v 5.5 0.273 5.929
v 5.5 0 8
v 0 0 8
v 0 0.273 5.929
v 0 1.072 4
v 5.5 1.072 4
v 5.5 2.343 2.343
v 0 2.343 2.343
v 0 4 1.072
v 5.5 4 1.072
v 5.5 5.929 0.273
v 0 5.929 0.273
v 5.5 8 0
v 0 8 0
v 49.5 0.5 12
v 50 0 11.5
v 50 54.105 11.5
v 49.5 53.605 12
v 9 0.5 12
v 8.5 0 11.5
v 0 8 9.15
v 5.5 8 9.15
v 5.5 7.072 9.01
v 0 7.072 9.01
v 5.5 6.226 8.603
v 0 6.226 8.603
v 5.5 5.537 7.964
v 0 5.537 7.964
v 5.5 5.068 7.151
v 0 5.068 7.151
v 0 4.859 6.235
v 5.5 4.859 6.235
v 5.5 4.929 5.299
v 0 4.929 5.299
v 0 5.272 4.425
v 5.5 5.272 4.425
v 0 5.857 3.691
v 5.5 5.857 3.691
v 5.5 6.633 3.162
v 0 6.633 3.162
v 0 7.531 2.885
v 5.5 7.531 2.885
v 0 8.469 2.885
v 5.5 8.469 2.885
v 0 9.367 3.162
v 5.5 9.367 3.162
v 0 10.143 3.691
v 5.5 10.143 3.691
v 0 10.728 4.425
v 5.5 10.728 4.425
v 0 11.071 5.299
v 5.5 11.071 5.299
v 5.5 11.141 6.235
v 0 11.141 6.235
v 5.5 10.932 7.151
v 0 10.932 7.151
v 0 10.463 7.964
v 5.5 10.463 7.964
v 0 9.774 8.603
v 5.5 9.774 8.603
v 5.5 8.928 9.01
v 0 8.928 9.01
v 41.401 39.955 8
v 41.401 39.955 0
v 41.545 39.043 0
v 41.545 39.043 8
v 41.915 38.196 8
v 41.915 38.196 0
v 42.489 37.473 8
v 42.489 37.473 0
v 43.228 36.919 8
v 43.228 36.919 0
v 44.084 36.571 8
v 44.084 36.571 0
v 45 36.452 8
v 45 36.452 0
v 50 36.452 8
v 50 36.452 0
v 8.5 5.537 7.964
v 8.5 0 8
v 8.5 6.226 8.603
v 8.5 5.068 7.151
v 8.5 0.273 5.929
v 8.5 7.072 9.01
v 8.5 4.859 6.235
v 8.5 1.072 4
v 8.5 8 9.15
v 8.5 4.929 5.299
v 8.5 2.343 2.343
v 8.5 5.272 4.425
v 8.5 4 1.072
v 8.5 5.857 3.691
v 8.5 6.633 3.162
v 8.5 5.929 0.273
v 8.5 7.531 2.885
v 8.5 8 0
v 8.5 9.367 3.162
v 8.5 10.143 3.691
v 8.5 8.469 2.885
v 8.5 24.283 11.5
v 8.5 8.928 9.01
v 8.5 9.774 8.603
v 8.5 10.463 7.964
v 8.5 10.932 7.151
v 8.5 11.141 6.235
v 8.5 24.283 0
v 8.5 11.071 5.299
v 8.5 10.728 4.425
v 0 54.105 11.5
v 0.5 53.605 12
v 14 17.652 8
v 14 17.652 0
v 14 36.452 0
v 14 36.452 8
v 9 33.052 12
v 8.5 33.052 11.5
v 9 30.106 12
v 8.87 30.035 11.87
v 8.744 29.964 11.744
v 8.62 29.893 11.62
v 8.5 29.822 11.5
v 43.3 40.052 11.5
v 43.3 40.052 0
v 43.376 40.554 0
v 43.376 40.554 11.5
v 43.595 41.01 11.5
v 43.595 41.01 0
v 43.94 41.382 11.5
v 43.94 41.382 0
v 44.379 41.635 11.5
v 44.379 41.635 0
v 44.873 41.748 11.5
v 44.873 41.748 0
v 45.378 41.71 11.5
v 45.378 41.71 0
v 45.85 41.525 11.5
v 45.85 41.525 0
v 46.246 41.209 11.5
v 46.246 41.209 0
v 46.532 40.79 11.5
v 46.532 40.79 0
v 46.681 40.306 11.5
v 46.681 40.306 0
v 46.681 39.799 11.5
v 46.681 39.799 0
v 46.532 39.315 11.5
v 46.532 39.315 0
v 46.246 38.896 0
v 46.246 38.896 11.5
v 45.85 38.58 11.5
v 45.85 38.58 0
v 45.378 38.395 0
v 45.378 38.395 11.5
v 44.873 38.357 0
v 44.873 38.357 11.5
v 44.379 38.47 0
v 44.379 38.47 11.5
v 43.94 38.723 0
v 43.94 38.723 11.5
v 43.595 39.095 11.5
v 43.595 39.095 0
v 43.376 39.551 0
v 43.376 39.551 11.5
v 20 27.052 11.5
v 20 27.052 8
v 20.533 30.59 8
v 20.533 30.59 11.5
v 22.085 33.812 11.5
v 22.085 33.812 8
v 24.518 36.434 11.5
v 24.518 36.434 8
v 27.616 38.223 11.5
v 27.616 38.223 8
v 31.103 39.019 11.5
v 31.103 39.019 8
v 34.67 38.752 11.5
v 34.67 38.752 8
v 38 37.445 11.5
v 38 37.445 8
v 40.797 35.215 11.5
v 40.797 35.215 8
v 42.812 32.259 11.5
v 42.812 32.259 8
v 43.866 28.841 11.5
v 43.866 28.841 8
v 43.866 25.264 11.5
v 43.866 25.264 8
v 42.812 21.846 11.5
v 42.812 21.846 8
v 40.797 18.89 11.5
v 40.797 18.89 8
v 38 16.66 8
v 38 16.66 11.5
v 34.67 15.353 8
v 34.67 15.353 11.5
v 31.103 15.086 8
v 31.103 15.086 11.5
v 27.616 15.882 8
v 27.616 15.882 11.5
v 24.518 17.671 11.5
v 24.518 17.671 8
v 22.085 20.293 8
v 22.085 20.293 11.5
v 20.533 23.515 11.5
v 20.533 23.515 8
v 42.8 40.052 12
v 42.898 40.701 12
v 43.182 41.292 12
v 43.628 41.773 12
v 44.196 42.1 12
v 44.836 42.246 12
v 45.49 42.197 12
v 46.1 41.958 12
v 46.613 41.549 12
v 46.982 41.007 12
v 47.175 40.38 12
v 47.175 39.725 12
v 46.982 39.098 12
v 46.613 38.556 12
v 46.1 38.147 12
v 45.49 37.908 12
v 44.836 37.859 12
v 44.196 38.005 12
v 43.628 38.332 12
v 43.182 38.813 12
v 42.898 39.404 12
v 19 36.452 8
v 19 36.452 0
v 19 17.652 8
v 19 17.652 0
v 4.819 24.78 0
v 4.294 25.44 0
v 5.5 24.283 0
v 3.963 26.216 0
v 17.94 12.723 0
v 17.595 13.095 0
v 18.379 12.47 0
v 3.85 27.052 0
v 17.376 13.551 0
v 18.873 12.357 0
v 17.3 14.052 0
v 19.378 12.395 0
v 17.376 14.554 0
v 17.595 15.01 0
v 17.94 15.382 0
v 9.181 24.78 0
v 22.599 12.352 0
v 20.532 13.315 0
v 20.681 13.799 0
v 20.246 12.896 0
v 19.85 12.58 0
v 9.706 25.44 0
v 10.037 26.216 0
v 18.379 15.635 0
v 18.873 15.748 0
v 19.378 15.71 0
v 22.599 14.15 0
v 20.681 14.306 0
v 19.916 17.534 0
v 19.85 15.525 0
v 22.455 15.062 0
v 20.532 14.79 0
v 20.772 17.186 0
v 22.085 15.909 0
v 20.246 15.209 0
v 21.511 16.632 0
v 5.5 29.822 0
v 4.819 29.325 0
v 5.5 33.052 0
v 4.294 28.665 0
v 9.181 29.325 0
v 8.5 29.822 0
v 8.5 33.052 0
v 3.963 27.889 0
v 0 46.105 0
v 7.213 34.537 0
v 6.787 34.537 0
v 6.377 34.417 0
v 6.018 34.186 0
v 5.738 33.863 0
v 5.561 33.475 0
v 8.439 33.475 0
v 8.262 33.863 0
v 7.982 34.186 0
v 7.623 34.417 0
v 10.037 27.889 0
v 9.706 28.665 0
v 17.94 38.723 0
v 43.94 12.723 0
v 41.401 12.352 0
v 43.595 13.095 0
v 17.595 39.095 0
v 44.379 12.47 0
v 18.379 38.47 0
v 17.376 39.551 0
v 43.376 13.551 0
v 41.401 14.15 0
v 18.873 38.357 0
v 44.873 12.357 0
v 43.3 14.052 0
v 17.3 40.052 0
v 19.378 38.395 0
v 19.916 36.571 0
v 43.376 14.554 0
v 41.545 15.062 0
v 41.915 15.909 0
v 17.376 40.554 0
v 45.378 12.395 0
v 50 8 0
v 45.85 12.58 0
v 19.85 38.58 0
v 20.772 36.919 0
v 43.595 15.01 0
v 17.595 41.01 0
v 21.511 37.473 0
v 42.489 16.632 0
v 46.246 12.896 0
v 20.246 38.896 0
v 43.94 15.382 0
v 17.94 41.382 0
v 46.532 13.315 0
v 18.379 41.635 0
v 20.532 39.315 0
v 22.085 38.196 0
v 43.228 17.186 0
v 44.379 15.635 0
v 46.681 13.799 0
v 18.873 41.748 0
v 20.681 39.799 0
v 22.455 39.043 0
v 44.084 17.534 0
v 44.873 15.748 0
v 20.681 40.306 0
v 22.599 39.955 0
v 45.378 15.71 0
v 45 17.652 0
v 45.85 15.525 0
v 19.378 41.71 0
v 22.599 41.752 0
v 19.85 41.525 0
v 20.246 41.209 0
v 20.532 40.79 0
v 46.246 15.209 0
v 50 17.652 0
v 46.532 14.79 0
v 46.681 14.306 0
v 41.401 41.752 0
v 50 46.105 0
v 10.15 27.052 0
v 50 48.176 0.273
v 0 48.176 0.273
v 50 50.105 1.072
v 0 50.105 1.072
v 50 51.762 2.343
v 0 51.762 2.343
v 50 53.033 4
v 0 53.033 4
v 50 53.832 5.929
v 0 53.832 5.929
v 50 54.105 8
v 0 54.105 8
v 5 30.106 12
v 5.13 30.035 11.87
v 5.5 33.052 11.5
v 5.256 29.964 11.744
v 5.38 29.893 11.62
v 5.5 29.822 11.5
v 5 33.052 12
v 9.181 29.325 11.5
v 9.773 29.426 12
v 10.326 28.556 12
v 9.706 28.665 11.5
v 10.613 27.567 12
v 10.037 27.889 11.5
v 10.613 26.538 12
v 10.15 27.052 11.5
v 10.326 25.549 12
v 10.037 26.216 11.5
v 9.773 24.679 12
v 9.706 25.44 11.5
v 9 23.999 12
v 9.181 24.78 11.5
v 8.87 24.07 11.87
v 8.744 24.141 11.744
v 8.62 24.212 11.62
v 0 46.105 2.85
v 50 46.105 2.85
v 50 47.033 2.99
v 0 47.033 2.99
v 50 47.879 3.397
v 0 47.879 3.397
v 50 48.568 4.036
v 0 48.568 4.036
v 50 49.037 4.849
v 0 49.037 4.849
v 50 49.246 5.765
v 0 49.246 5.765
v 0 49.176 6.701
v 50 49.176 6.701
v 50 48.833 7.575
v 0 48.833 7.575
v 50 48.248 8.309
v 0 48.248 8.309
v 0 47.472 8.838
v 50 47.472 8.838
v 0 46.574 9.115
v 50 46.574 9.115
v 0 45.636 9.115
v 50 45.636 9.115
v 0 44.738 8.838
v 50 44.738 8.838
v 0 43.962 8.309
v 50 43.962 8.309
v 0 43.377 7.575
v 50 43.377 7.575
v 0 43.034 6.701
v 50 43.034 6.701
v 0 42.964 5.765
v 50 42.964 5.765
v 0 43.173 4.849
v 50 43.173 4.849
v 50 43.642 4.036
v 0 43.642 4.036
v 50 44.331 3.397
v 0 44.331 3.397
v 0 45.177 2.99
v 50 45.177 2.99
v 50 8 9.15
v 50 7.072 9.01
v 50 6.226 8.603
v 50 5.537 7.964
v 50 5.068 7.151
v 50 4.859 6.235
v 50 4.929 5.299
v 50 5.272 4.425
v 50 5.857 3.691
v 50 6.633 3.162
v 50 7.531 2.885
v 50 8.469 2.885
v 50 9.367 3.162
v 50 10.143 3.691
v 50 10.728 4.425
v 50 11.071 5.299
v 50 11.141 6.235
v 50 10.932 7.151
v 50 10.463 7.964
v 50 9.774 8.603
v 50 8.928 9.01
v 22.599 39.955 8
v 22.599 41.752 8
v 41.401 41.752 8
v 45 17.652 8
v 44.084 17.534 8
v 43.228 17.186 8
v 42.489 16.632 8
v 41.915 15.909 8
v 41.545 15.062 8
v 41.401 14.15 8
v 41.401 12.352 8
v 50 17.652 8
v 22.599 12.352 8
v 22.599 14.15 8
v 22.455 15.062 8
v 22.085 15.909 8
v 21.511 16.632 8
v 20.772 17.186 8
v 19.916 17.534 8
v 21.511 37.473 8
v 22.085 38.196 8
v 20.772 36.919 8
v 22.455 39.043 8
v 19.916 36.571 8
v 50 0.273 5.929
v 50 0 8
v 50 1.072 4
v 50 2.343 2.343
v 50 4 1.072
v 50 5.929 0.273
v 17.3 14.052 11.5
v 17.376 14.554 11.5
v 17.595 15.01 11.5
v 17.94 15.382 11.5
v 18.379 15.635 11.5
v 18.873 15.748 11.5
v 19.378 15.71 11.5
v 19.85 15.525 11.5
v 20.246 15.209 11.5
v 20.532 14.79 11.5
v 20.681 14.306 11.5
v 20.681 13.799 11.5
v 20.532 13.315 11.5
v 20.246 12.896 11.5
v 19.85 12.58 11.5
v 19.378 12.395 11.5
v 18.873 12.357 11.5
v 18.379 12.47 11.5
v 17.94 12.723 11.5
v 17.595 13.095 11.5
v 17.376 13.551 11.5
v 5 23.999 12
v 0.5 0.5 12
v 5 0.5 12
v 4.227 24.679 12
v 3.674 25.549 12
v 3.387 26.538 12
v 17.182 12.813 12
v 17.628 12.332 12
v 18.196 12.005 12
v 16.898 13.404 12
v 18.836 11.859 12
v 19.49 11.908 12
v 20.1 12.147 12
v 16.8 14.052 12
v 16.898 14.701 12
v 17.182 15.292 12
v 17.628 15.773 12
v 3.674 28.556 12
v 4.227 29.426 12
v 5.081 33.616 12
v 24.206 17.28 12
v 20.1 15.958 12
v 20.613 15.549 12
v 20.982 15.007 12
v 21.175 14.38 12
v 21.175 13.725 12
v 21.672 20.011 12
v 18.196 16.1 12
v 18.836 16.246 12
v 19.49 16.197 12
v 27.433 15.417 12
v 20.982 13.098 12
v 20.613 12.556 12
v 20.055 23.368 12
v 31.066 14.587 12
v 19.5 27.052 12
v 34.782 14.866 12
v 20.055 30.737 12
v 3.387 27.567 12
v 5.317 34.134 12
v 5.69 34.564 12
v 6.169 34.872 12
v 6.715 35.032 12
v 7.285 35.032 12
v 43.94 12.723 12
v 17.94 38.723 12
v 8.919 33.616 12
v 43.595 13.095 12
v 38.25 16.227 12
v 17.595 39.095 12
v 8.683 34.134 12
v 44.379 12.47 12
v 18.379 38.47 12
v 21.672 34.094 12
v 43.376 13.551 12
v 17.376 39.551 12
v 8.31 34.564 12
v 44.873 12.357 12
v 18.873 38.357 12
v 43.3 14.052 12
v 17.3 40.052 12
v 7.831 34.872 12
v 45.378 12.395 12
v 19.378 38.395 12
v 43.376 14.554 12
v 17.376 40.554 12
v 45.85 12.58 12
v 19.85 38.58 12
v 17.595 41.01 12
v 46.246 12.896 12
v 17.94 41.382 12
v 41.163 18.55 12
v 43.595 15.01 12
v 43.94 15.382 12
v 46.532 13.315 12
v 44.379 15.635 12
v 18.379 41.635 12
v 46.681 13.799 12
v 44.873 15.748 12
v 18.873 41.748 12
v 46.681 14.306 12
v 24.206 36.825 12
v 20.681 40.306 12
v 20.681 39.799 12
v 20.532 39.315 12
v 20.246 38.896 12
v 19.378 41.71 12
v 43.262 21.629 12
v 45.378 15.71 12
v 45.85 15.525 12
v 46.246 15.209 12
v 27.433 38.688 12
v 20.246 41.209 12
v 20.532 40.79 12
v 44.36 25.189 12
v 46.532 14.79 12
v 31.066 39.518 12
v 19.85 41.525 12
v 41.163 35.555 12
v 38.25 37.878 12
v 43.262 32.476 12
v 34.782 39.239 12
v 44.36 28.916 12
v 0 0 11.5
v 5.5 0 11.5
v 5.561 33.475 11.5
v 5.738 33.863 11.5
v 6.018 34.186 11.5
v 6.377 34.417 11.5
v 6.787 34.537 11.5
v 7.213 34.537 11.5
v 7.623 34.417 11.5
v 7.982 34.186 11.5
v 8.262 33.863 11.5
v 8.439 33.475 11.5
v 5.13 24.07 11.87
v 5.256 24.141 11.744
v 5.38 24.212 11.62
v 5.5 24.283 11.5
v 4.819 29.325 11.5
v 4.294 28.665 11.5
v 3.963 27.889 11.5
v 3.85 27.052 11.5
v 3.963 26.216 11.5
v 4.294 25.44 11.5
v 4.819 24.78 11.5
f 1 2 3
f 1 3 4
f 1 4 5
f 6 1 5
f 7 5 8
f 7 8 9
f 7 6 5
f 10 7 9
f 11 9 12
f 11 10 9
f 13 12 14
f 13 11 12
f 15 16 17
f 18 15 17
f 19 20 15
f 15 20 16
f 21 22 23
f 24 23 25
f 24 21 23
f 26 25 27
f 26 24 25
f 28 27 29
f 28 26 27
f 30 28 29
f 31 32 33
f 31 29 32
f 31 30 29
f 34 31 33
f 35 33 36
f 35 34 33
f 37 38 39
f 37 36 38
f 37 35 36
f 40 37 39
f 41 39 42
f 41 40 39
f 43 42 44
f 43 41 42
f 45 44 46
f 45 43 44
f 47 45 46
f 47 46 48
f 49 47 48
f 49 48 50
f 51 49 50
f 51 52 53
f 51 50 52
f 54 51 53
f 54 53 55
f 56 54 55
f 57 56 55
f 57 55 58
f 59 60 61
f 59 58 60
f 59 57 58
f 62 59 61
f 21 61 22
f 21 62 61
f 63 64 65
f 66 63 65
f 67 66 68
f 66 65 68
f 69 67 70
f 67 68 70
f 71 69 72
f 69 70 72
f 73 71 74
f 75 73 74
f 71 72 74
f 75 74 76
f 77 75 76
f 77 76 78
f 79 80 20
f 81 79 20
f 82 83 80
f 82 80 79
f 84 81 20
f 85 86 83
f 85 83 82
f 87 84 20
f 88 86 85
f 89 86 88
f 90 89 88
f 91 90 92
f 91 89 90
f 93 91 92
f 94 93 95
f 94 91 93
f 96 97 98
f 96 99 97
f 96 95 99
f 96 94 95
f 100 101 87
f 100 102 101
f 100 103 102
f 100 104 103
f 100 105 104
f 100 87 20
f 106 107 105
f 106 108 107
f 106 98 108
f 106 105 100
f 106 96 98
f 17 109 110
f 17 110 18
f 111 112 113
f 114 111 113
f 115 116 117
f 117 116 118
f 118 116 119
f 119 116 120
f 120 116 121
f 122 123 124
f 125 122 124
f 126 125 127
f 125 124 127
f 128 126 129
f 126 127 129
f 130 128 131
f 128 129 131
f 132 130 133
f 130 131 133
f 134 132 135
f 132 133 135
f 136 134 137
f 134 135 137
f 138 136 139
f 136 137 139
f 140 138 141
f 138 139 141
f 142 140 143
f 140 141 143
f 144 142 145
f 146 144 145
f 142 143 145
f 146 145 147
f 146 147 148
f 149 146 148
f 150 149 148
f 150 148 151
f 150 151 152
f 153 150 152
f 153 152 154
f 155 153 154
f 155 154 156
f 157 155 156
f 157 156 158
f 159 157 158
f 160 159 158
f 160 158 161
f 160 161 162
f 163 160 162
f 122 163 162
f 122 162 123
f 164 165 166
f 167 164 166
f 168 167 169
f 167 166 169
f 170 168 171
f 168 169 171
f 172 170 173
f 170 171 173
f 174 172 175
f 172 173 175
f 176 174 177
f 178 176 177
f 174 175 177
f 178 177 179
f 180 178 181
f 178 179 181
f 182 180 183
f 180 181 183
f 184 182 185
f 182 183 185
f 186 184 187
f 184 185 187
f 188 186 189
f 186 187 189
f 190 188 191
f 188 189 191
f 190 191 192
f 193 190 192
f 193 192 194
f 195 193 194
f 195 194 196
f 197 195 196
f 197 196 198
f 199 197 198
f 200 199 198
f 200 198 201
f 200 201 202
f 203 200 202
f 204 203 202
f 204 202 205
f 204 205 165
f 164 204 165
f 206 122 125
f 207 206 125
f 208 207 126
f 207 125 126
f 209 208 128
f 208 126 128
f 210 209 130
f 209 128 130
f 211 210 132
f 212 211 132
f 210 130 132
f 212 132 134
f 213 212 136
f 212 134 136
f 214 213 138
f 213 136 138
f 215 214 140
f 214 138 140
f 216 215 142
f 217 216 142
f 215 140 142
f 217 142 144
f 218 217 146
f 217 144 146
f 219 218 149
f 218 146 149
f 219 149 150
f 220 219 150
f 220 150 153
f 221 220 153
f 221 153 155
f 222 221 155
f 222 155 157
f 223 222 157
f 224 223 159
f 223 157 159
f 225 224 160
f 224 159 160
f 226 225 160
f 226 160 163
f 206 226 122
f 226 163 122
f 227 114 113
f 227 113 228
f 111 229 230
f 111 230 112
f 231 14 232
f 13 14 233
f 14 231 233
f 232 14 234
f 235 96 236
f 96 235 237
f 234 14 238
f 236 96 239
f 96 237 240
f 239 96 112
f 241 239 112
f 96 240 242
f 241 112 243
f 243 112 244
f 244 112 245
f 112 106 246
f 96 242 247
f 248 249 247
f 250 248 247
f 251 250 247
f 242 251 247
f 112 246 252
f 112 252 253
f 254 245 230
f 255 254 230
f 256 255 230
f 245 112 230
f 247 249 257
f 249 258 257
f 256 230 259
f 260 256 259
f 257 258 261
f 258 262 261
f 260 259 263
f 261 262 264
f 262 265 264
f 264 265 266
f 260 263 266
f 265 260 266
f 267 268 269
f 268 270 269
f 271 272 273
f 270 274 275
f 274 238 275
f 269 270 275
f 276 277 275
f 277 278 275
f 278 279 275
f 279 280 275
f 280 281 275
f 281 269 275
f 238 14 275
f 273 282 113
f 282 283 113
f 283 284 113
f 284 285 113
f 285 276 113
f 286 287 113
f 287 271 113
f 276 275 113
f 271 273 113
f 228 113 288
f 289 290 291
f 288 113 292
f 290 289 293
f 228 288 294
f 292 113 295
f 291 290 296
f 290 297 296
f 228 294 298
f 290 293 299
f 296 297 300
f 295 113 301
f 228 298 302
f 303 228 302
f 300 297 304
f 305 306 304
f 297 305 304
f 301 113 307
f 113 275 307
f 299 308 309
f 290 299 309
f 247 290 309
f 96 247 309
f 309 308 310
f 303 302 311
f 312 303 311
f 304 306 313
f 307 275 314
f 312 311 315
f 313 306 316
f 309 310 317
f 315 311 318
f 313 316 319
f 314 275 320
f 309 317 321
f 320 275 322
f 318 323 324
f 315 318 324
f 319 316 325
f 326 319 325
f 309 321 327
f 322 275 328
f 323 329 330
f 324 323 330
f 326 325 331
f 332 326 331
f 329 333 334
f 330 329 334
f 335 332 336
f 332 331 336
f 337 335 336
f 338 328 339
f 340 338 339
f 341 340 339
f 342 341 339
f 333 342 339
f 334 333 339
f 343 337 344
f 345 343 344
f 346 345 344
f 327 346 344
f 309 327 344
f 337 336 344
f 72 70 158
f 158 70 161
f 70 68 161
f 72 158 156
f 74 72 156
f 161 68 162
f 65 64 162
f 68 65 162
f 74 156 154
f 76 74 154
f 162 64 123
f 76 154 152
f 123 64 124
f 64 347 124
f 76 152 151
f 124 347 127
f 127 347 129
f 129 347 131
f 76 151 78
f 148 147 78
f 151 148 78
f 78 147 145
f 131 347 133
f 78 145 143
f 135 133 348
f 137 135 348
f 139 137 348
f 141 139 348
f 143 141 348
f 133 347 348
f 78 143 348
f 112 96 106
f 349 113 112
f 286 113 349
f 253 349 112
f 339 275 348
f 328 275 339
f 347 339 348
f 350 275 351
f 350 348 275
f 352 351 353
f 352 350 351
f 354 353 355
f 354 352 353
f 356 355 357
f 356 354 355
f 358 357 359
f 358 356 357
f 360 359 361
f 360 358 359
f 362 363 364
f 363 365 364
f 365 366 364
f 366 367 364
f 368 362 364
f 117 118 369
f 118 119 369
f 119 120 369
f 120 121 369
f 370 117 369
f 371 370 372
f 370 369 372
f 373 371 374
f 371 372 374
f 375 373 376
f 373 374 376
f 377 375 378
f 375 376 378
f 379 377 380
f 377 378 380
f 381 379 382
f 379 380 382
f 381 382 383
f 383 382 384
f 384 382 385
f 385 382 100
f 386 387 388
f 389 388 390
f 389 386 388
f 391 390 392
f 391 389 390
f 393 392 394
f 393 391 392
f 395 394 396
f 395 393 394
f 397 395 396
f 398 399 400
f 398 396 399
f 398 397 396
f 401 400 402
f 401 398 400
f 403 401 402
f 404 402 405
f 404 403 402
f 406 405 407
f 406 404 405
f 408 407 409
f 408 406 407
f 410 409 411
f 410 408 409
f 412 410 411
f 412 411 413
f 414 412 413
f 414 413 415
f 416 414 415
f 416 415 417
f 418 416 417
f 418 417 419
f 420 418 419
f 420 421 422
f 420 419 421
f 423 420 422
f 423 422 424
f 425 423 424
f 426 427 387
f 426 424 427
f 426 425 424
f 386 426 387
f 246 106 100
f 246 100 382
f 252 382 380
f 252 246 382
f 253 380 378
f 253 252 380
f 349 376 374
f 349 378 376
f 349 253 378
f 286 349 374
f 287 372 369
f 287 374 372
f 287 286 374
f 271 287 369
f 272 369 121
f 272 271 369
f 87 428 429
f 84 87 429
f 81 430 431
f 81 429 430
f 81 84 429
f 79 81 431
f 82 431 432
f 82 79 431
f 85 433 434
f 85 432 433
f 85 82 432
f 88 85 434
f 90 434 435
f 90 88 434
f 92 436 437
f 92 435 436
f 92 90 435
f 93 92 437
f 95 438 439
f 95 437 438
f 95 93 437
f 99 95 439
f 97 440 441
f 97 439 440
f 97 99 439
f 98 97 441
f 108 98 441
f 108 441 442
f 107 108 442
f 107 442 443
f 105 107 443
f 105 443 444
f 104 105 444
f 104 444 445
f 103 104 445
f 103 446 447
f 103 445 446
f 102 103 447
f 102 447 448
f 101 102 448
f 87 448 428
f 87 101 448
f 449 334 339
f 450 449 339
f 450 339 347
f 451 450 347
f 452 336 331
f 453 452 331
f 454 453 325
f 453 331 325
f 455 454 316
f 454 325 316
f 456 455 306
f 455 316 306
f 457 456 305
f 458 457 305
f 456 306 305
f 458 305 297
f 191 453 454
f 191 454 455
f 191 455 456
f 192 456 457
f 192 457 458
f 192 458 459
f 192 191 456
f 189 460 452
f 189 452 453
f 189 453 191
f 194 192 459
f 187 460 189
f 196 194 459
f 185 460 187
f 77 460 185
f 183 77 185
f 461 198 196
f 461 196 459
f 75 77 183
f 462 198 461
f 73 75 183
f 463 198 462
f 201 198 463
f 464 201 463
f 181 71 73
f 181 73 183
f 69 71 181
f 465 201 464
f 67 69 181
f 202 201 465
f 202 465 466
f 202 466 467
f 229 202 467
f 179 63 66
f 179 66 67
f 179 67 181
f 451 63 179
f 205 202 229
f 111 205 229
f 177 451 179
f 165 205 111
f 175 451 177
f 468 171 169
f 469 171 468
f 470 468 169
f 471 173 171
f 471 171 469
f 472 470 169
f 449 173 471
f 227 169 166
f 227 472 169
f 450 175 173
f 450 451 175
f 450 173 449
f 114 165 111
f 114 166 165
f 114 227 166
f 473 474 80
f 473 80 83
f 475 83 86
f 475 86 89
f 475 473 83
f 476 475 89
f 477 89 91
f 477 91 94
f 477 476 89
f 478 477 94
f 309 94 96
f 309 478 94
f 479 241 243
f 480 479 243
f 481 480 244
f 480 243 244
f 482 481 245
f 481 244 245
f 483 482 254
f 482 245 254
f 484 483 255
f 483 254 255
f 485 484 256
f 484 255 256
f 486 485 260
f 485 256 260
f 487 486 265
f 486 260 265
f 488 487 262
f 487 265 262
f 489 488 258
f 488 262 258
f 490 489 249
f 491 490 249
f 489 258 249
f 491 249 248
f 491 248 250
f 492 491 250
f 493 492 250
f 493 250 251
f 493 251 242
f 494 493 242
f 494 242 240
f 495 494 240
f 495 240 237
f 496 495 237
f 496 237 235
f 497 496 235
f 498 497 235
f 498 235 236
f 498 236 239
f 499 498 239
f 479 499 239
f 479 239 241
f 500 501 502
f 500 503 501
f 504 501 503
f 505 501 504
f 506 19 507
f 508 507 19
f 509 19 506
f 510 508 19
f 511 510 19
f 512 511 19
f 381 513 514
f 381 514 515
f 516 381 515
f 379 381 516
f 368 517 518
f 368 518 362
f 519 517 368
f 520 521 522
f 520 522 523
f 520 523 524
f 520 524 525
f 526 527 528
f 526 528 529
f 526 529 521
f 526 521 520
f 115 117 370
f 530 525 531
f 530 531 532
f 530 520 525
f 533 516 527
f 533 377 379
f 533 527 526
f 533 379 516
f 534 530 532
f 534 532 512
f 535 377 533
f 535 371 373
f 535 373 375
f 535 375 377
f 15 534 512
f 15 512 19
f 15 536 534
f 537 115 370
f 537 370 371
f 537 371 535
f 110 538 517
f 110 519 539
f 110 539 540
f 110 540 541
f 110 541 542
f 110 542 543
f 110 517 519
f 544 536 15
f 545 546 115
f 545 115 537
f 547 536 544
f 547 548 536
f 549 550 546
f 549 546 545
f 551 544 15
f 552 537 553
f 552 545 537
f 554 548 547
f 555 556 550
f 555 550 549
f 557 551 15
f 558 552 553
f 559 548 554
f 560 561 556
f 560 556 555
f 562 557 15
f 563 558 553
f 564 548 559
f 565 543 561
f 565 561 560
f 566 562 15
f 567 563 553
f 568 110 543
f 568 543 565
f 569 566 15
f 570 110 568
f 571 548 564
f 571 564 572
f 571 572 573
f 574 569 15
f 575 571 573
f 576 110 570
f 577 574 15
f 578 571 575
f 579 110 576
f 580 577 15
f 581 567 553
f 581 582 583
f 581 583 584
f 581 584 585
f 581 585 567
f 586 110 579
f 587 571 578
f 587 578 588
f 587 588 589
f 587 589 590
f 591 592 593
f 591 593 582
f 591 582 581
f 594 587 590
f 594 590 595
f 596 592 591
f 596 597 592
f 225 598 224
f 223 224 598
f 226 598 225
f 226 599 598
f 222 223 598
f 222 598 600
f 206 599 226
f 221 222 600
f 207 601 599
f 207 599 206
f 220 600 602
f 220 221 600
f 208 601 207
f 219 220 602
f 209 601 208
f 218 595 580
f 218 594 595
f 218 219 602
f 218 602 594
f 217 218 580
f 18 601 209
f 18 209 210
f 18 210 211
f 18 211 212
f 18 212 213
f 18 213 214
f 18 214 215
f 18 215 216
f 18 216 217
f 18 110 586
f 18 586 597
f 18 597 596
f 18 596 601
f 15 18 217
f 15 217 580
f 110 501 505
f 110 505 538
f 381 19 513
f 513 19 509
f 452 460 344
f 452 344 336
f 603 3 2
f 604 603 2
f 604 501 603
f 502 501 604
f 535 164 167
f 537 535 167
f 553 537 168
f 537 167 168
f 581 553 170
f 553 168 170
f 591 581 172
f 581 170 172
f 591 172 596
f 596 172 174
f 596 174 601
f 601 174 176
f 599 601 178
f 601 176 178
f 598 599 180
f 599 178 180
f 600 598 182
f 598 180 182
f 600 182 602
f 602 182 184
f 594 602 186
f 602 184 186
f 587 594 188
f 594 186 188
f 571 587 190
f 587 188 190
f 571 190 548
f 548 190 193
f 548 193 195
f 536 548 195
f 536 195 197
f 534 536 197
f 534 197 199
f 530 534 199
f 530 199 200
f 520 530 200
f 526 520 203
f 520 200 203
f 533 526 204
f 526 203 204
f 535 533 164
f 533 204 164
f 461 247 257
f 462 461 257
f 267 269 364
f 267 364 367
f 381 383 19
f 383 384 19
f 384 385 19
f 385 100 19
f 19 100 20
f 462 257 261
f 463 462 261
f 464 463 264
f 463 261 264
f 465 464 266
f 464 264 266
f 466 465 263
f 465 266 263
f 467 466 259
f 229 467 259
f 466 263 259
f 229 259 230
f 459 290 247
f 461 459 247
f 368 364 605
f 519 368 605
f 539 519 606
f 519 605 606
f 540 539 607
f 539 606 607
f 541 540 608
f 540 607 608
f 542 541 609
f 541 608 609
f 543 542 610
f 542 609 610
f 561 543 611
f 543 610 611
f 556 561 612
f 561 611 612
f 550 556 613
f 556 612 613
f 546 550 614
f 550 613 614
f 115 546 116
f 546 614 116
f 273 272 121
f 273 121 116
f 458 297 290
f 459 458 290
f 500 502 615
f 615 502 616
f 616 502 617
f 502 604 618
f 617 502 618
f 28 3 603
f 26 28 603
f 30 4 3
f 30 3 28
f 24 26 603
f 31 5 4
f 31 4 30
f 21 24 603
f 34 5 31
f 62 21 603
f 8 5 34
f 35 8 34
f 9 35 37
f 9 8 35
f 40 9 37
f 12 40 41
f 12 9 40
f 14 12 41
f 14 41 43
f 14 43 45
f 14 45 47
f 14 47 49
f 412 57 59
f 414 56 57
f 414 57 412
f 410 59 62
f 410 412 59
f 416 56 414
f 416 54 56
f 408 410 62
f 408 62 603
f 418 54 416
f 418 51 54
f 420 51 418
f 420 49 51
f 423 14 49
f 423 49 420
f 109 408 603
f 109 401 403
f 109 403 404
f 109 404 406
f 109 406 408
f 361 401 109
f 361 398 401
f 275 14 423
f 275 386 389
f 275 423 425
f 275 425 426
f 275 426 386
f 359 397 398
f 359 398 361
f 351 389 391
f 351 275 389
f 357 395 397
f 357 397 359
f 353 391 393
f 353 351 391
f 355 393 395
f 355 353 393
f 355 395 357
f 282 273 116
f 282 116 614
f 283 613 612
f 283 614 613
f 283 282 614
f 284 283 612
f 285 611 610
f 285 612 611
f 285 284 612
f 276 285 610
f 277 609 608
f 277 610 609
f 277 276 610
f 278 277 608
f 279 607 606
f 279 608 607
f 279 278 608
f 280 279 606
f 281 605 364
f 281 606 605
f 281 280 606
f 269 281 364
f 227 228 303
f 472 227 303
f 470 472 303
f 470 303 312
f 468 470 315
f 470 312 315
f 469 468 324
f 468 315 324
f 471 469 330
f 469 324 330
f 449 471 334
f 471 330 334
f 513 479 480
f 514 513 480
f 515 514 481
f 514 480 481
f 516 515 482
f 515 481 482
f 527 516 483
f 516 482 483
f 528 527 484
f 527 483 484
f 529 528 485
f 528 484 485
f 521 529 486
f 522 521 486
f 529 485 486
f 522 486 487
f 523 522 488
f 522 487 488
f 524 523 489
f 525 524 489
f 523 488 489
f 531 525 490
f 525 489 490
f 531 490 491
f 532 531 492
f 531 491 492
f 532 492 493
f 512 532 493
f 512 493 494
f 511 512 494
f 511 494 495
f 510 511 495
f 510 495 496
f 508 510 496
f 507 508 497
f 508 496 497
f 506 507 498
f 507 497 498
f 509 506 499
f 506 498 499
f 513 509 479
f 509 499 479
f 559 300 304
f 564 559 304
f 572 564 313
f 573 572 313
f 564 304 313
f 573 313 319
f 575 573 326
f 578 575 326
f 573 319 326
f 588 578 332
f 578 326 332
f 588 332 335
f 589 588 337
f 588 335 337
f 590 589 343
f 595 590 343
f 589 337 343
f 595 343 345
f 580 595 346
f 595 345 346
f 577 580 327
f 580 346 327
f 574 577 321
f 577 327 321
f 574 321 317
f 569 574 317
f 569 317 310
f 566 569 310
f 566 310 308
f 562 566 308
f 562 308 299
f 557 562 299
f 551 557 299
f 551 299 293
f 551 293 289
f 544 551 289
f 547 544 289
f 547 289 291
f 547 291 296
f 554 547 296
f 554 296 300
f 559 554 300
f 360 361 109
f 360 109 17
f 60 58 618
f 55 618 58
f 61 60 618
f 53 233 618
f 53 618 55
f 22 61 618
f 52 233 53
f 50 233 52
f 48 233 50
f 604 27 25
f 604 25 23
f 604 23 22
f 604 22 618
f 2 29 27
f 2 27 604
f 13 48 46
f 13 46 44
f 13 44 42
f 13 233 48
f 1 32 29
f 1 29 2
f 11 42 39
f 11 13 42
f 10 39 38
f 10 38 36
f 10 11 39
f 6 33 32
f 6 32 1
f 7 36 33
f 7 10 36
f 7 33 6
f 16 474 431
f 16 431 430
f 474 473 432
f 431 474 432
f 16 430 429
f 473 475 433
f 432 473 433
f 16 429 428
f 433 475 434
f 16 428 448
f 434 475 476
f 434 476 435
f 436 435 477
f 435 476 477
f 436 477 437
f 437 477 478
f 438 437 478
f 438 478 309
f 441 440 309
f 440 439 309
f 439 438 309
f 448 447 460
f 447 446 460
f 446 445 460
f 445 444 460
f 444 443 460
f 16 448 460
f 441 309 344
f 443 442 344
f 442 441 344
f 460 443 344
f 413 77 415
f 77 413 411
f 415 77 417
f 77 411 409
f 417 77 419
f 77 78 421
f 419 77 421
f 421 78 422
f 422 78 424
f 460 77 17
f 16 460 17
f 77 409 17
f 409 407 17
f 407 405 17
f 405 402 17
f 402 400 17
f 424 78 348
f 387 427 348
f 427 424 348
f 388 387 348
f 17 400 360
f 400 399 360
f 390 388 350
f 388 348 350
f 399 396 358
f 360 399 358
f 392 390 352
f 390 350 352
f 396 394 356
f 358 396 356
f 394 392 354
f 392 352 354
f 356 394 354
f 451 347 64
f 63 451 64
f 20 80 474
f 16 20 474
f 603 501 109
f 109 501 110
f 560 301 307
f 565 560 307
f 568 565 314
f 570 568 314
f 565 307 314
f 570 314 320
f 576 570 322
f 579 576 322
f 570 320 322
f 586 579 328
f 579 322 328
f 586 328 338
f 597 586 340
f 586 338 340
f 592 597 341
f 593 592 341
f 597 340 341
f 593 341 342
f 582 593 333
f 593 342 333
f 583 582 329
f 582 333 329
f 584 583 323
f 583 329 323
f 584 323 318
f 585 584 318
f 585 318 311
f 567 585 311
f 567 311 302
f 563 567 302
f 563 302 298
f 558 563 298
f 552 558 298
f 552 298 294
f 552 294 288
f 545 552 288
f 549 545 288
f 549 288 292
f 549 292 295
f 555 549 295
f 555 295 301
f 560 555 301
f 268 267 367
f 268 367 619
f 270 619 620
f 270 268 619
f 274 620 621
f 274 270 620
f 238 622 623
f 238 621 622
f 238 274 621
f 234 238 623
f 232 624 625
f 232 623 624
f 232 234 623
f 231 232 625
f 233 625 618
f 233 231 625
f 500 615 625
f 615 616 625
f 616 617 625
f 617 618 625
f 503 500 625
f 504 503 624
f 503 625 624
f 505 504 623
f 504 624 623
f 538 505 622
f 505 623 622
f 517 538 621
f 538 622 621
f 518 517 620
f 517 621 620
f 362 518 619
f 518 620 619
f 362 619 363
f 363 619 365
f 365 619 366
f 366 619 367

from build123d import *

# Parameters (mm, degrees)
SKETCH1_W           = 50
SKETCH1_H           = 54.105
BOSS_EXTRUDE1_DEPTH = 12
SKETCH2_R           = 3.15
CUT_EXTRUDE1_DEPTH  = 75.641483272
FILLET1_R           = 8
SKETCH3_R           = 12
SKETCH3_R_2         = 1.7
CUT_EXTRUDE2_DEPTH  = 75.641483272
CUT_EXTRUDE4_DEPTH  = 8
CHAMFER1_SIZE       = 0.5


with BuildPart() as part:
    # Sketch1 → Boss-Extrude1 (new body)
    with BuildSketch(Plane.XY):
        with Locations((25, 27.0525)):
            Rectangle(SKETCH1_W, SKETCH1_H)
    extrude(amount=BOSS_EXTRUDE1_DEPTH)

    # Sketch2 → Cut-Extrude1 (cut, through all)
    with BuildSketch(Plane(origin=(0, 0, 0), x_dir=(0, 0, -1), z_dir=(1, 0, 0))):
        with Locations((-6, 46.105)):
            Circle(SKETCH2_R)
        with Locations(Location((-6, 8, 0), (0, 0, 180))):
            Circle(SKETCH2_R)
    extrude(amount=CUT_EXTRUDE1_DEPTH, mode=Mode.SUBTRACT)

    # Fillet1
    fillet1_edges = [part.edges().sort_by_distance(p)[0] for p in [
        (25, 54.105, 0),
        (25, 0, 0),
    ]]
    fillet(fillet1_edges, radius=FILLET1_R)

    # Sketch3 → Cut-Extrude2 (cut, through all)
    with BuildSketch(Plane(origin=(0, 0, 0), x_dir=(-1, 0, 0), z_dir=(0, 0, -1))):
        with Locations((-32, 27.0525)):
            Circle(SKETCH3_R)
        with Locations((-19, 40.0525)):
            Circle(SKETCH3_R_2)
        with Locations((-19, 14.0525)):
            Circle(SKETCH3_R_2)
        with Locations((-45, 14.0525)):
            Circle(SKETCH3_R_2)
        with Locations((-45, 40.0525)):
            Circle(SKETCH3_R_2)
        with BuildLine():
            Line((-8.5, 0), (-8.5, 24.282572203))
            ThreePointArc((-8.5, 24.282572203), (-10.15, 27.0525), (-8.5, 29.822427797))
            Line((-8.5, 29.822427797), (-8.5, 33.0525))
            ThreePointArc((-8.5, 33.0525), (-7, 34.5525), (-5.5, 33.0525))
            Line((-5.5, 33.0525), (-5.5, 29.822427797))
            ThreePointArc((-5.5, 29.822427797), (-3.85, 27.0525), (-5.5, 24.282572203))
            Line((-5.5, 24.282572203), (-5.5, 0))
            Line((-5.5, 0), (-8.5, 0))
        make_face()
    extrude(amount=-CUT_EXTRUDE2_DEPTH, mode=Mode.SUBTRACT)

    # Sketch5 → Cut-Extrude4 (cut)
    with BuildSketch(Plane(origin=(0, 0, 0), x_dir=(-1, 0, 0), z_dir=(0, 0, -1))):
        with BuildLine():
            Line((-19, 17.6525), (-14, 17.6525))
            Line((-14, 17.6525), (-14, 36.4525))
            Line((-14, 36.4525), (-19, 36.4525))
            ThreePointArc((-19, 36.4525), (-21.510876341, 37.472674425), (-22.598679445, 39.955))
            Line((-22.598679445, 39.955), (-22.598679445, 41.7525))
            Line((-22.598679445, 41.7525), (-41.401320555, 41.7525))
            Line((-41.401320555, 41.7525), (-41.401320555, 39.955))
            ThreePointArc((-41.401320555, 39.955), (-42.489123659, 37.472674425), (-45, 36.4525))
            Line((-45, 36.4525), (-50, 36.4525))
            Line((-50, 36.4525), (-50, 17.6525))
            Line((-50, 17.6525), (-45, 17.6525))
            ThreePointArc((-45, 17.6525), (-42.489123659, 16.632325575), (-41.401320555, 14.15))
            Line((-41.401320555, 14.15), (-41.401320555, 12.3525))
            Line((-41.401320555, 12.3525), (-22.598679445, 12.3525))
            Line((-22.598679445, 12.3525), (-22.598679445, 14.15))
            ThreePointArc((-22.598679445, 14.15), (-21.510876341, 16.632325575), (-19, 17.6525))
        make_face()
    extrude(amount=-CUT_EXTRUDE4_DEPTH, mode=Mode.SUBTRACT)

    # Chamfer1
    chamfer1_edges = [part.edges().sort_by_distance(p)[0] for p in [
        (50, 27.0525, 12),
        (25, 54.105, 12),
        (0, 27.0525, 12),
        (29.25, 0, 12),
        (10.15, 27.0525, 12),
        (8.5, 31.437463898, 12),
        (7, 34.5525, 12),
        (5.5, 31.437463898, 12),
        (3.85, 27.0525, 12),
        (5.5, 12.141286102, 12),
        (8.5, 12.141286102, 12),
        (44, 27.0525, 12),
        (2.75, 0, 12),
        (20.7, 14.0525, 12),
        (46.7, 40.0525, 12),
    ]]
    chamfer(chamfer1_edges, length=CHAMFER1_SIZE)


solid = part.part
